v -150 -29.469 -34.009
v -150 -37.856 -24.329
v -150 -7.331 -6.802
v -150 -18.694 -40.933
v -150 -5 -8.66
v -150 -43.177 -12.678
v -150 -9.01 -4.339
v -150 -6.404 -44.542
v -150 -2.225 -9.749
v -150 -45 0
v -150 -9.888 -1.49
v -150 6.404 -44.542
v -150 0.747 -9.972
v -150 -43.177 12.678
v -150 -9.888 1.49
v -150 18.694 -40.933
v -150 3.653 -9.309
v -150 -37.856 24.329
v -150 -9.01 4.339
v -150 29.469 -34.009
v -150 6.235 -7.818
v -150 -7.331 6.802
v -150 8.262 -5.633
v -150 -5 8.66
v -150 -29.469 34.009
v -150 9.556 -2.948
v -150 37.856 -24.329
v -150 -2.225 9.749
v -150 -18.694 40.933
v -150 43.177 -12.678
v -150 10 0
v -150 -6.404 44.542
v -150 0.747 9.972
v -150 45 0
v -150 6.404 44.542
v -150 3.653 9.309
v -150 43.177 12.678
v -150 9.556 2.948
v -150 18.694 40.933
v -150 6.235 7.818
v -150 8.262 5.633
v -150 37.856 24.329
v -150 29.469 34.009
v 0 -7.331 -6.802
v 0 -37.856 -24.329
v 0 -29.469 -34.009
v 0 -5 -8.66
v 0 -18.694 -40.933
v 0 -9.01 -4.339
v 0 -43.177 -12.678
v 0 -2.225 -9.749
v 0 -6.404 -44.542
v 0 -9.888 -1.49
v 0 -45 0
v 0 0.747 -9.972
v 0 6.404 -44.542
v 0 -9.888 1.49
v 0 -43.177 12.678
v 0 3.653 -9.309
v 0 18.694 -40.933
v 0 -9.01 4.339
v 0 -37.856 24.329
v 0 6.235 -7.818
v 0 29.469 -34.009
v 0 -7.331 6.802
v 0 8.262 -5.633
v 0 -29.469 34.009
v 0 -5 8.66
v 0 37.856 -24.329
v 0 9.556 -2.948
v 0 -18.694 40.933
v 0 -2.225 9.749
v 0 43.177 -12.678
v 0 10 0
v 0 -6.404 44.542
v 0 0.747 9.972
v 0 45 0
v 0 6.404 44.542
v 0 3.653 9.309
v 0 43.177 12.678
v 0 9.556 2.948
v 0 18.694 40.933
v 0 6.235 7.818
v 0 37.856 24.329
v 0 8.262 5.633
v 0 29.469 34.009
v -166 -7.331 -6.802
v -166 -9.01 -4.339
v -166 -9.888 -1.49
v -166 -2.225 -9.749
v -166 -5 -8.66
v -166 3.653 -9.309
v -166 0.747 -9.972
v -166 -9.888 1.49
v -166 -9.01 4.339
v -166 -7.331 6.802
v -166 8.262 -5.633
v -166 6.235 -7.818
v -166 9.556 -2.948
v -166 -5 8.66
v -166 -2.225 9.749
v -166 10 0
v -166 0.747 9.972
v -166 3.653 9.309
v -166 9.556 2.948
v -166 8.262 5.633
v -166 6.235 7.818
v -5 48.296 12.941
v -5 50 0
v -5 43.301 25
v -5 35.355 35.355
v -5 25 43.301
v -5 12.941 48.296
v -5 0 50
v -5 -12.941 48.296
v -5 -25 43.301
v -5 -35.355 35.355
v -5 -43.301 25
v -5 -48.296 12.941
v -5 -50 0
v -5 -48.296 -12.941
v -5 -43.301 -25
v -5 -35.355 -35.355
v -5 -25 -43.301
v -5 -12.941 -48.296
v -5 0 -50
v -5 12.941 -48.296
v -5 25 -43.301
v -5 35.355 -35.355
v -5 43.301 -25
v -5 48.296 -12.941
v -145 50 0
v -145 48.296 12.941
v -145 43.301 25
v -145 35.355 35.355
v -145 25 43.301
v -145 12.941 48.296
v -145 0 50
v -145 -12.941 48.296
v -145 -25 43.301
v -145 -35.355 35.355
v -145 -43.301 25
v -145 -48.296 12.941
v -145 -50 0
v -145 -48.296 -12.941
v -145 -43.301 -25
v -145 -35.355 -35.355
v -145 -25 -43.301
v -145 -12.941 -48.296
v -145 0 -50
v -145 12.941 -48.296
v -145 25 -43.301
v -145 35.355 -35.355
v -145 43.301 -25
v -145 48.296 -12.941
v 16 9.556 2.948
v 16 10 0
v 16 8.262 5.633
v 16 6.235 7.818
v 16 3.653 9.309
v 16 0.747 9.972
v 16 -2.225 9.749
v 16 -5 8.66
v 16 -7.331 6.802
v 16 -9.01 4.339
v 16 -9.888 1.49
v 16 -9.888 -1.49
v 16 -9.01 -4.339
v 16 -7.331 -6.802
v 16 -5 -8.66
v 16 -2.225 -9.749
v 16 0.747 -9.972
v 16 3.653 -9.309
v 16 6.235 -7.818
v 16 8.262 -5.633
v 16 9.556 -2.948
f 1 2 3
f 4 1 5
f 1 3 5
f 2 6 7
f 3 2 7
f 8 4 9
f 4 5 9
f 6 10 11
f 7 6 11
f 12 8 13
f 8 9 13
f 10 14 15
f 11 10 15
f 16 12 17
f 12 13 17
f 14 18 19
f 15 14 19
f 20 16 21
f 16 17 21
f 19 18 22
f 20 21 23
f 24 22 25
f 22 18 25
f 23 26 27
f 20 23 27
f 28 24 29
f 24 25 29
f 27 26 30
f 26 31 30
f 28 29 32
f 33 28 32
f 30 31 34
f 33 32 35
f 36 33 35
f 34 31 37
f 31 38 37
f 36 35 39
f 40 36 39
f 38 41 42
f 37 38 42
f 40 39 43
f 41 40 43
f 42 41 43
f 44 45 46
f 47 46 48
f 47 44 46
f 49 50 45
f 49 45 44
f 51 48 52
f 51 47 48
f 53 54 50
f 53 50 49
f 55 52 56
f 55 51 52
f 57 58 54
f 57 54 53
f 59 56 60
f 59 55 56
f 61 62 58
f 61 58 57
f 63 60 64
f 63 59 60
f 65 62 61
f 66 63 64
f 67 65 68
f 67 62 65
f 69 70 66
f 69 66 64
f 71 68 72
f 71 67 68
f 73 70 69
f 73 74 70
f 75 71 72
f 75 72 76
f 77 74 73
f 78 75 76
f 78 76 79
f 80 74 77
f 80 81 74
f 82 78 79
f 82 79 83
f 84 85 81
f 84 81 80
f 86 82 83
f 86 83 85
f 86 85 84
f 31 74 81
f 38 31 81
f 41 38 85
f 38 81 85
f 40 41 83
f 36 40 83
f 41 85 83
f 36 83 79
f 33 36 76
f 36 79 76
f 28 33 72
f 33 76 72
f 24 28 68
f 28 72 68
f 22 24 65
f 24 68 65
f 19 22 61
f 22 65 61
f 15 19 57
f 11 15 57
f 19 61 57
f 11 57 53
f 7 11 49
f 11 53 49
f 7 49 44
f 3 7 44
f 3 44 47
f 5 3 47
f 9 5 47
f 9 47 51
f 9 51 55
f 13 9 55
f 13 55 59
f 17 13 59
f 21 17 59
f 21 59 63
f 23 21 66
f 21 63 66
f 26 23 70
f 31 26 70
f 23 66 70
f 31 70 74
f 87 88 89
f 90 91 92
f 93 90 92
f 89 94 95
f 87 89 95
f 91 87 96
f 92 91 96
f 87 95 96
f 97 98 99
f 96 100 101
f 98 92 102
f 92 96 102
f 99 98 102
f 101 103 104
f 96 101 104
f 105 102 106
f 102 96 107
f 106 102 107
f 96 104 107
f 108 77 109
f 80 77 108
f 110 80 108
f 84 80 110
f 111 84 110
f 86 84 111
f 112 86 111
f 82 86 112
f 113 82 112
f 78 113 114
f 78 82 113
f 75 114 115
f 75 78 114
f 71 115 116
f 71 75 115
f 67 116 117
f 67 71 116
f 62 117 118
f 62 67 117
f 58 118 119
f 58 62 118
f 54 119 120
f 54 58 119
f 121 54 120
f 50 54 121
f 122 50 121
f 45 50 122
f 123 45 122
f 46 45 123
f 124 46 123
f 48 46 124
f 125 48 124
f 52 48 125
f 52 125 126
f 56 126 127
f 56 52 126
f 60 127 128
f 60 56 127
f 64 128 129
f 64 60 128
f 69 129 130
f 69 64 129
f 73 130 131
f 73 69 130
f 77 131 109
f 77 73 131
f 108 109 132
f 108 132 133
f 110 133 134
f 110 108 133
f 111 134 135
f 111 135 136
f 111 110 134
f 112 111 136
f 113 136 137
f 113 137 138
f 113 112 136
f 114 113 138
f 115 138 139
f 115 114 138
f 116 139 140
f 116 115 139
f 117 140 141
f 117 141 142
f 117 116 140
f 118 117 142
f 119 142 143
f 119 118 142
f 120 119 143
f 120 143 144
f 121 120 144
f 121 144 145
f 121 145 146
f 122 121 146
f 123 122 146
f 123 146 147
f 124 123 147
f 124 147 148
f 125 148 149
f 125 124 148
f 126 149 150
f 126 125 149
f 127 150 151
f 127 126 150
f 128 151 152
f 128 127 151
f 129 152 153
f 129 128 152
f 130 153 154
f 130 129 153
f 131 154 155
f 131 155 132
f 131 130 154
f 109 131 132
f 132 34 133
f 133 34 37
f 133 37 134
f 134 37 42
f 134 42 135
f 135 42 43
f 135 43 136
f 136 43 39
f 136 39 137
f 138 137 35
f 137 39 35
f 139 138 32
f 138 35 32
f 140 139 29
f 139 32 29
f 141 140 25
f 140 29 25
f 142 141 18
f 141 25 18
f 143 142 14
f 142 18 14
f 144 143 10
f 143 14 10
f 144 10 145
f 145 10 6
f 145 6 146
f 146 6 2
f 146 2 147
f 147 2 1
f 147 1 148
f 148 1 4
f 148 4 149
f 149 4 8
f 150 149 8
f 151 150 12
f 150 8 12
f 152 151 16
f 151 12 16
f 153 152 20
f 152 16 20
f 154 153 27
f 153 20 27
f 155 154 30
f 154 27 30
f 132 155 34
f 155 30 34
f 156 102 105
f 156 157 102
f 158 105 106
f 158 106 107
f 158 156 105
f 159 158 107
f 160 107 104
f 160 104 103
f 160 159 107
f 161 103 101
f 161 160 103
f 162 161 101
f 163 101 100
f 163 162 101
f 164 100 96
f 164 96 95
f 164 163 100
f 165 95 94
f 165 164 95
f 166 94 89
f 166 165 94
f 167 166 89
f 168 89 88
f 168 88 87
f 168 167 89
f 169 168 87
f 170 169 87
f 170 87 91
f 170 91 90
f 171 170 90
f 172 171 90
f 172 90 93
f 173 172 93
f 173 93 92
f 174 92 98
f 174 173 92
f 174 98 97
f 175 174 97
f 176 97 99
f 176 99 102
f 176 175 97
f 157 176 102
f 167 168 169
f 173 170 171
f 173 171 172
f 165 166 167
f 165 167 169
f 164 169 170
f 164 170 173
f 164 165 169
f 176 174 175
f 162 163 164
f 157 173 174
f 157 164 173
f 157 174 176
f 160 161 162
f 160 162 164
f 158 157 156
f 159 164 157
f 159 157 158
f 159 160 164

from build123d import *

# Parameters (mm, degrees)
F0_R     = 10
F1_DEPTH = 16
F0_R_2   = 50
F2_DEPTH = 150
F3_SIZE2 = 5
F3_SIZE  = 5
F4_SIZE2 = 5
F4_SIZE  = 5
F5_DEPTH = 166


with BuildPart() as f1:
    # F0 (on Right) → F1 (new body)
    with BuildSketch(Plane.YZ):
        Circle(F0_R)
    extrude(amount=F1_DEPTH)

    # F0 (on Right) → F5 (join)
    with BuildSketch(Plane.YZ):
        Circle(F0_R)
    extrude(amount=-F5_DEPTH)


with BuildPart() as f2:
    # F0 (on Right) → F2 (new body)
    with BuildSketch(Plane.YZ):
        Circle(F0_R_2)
        Circle(F0_R, mode=Mode.SUBTRACT)
    extrude(amount=-F2_DEPTH)

    # F3
    f3_edges = [f2.edges().sort_by_distance(p)[0] for p in [
        (0, -50, 0),
    ]]
    chamfer(f3_edges, length=F3_SIZE, length2=F3_SIZE2)

    # F4
    f4_edges = [f2.edges().sort_by_distance(p)[0] for p in [
        (-150, -50, 0),
    ]]
    chamfer(f4_edges, length=F4_SIZE, length2=F4_SIZE2)


solid = Compound([f1.part, f2.part])
